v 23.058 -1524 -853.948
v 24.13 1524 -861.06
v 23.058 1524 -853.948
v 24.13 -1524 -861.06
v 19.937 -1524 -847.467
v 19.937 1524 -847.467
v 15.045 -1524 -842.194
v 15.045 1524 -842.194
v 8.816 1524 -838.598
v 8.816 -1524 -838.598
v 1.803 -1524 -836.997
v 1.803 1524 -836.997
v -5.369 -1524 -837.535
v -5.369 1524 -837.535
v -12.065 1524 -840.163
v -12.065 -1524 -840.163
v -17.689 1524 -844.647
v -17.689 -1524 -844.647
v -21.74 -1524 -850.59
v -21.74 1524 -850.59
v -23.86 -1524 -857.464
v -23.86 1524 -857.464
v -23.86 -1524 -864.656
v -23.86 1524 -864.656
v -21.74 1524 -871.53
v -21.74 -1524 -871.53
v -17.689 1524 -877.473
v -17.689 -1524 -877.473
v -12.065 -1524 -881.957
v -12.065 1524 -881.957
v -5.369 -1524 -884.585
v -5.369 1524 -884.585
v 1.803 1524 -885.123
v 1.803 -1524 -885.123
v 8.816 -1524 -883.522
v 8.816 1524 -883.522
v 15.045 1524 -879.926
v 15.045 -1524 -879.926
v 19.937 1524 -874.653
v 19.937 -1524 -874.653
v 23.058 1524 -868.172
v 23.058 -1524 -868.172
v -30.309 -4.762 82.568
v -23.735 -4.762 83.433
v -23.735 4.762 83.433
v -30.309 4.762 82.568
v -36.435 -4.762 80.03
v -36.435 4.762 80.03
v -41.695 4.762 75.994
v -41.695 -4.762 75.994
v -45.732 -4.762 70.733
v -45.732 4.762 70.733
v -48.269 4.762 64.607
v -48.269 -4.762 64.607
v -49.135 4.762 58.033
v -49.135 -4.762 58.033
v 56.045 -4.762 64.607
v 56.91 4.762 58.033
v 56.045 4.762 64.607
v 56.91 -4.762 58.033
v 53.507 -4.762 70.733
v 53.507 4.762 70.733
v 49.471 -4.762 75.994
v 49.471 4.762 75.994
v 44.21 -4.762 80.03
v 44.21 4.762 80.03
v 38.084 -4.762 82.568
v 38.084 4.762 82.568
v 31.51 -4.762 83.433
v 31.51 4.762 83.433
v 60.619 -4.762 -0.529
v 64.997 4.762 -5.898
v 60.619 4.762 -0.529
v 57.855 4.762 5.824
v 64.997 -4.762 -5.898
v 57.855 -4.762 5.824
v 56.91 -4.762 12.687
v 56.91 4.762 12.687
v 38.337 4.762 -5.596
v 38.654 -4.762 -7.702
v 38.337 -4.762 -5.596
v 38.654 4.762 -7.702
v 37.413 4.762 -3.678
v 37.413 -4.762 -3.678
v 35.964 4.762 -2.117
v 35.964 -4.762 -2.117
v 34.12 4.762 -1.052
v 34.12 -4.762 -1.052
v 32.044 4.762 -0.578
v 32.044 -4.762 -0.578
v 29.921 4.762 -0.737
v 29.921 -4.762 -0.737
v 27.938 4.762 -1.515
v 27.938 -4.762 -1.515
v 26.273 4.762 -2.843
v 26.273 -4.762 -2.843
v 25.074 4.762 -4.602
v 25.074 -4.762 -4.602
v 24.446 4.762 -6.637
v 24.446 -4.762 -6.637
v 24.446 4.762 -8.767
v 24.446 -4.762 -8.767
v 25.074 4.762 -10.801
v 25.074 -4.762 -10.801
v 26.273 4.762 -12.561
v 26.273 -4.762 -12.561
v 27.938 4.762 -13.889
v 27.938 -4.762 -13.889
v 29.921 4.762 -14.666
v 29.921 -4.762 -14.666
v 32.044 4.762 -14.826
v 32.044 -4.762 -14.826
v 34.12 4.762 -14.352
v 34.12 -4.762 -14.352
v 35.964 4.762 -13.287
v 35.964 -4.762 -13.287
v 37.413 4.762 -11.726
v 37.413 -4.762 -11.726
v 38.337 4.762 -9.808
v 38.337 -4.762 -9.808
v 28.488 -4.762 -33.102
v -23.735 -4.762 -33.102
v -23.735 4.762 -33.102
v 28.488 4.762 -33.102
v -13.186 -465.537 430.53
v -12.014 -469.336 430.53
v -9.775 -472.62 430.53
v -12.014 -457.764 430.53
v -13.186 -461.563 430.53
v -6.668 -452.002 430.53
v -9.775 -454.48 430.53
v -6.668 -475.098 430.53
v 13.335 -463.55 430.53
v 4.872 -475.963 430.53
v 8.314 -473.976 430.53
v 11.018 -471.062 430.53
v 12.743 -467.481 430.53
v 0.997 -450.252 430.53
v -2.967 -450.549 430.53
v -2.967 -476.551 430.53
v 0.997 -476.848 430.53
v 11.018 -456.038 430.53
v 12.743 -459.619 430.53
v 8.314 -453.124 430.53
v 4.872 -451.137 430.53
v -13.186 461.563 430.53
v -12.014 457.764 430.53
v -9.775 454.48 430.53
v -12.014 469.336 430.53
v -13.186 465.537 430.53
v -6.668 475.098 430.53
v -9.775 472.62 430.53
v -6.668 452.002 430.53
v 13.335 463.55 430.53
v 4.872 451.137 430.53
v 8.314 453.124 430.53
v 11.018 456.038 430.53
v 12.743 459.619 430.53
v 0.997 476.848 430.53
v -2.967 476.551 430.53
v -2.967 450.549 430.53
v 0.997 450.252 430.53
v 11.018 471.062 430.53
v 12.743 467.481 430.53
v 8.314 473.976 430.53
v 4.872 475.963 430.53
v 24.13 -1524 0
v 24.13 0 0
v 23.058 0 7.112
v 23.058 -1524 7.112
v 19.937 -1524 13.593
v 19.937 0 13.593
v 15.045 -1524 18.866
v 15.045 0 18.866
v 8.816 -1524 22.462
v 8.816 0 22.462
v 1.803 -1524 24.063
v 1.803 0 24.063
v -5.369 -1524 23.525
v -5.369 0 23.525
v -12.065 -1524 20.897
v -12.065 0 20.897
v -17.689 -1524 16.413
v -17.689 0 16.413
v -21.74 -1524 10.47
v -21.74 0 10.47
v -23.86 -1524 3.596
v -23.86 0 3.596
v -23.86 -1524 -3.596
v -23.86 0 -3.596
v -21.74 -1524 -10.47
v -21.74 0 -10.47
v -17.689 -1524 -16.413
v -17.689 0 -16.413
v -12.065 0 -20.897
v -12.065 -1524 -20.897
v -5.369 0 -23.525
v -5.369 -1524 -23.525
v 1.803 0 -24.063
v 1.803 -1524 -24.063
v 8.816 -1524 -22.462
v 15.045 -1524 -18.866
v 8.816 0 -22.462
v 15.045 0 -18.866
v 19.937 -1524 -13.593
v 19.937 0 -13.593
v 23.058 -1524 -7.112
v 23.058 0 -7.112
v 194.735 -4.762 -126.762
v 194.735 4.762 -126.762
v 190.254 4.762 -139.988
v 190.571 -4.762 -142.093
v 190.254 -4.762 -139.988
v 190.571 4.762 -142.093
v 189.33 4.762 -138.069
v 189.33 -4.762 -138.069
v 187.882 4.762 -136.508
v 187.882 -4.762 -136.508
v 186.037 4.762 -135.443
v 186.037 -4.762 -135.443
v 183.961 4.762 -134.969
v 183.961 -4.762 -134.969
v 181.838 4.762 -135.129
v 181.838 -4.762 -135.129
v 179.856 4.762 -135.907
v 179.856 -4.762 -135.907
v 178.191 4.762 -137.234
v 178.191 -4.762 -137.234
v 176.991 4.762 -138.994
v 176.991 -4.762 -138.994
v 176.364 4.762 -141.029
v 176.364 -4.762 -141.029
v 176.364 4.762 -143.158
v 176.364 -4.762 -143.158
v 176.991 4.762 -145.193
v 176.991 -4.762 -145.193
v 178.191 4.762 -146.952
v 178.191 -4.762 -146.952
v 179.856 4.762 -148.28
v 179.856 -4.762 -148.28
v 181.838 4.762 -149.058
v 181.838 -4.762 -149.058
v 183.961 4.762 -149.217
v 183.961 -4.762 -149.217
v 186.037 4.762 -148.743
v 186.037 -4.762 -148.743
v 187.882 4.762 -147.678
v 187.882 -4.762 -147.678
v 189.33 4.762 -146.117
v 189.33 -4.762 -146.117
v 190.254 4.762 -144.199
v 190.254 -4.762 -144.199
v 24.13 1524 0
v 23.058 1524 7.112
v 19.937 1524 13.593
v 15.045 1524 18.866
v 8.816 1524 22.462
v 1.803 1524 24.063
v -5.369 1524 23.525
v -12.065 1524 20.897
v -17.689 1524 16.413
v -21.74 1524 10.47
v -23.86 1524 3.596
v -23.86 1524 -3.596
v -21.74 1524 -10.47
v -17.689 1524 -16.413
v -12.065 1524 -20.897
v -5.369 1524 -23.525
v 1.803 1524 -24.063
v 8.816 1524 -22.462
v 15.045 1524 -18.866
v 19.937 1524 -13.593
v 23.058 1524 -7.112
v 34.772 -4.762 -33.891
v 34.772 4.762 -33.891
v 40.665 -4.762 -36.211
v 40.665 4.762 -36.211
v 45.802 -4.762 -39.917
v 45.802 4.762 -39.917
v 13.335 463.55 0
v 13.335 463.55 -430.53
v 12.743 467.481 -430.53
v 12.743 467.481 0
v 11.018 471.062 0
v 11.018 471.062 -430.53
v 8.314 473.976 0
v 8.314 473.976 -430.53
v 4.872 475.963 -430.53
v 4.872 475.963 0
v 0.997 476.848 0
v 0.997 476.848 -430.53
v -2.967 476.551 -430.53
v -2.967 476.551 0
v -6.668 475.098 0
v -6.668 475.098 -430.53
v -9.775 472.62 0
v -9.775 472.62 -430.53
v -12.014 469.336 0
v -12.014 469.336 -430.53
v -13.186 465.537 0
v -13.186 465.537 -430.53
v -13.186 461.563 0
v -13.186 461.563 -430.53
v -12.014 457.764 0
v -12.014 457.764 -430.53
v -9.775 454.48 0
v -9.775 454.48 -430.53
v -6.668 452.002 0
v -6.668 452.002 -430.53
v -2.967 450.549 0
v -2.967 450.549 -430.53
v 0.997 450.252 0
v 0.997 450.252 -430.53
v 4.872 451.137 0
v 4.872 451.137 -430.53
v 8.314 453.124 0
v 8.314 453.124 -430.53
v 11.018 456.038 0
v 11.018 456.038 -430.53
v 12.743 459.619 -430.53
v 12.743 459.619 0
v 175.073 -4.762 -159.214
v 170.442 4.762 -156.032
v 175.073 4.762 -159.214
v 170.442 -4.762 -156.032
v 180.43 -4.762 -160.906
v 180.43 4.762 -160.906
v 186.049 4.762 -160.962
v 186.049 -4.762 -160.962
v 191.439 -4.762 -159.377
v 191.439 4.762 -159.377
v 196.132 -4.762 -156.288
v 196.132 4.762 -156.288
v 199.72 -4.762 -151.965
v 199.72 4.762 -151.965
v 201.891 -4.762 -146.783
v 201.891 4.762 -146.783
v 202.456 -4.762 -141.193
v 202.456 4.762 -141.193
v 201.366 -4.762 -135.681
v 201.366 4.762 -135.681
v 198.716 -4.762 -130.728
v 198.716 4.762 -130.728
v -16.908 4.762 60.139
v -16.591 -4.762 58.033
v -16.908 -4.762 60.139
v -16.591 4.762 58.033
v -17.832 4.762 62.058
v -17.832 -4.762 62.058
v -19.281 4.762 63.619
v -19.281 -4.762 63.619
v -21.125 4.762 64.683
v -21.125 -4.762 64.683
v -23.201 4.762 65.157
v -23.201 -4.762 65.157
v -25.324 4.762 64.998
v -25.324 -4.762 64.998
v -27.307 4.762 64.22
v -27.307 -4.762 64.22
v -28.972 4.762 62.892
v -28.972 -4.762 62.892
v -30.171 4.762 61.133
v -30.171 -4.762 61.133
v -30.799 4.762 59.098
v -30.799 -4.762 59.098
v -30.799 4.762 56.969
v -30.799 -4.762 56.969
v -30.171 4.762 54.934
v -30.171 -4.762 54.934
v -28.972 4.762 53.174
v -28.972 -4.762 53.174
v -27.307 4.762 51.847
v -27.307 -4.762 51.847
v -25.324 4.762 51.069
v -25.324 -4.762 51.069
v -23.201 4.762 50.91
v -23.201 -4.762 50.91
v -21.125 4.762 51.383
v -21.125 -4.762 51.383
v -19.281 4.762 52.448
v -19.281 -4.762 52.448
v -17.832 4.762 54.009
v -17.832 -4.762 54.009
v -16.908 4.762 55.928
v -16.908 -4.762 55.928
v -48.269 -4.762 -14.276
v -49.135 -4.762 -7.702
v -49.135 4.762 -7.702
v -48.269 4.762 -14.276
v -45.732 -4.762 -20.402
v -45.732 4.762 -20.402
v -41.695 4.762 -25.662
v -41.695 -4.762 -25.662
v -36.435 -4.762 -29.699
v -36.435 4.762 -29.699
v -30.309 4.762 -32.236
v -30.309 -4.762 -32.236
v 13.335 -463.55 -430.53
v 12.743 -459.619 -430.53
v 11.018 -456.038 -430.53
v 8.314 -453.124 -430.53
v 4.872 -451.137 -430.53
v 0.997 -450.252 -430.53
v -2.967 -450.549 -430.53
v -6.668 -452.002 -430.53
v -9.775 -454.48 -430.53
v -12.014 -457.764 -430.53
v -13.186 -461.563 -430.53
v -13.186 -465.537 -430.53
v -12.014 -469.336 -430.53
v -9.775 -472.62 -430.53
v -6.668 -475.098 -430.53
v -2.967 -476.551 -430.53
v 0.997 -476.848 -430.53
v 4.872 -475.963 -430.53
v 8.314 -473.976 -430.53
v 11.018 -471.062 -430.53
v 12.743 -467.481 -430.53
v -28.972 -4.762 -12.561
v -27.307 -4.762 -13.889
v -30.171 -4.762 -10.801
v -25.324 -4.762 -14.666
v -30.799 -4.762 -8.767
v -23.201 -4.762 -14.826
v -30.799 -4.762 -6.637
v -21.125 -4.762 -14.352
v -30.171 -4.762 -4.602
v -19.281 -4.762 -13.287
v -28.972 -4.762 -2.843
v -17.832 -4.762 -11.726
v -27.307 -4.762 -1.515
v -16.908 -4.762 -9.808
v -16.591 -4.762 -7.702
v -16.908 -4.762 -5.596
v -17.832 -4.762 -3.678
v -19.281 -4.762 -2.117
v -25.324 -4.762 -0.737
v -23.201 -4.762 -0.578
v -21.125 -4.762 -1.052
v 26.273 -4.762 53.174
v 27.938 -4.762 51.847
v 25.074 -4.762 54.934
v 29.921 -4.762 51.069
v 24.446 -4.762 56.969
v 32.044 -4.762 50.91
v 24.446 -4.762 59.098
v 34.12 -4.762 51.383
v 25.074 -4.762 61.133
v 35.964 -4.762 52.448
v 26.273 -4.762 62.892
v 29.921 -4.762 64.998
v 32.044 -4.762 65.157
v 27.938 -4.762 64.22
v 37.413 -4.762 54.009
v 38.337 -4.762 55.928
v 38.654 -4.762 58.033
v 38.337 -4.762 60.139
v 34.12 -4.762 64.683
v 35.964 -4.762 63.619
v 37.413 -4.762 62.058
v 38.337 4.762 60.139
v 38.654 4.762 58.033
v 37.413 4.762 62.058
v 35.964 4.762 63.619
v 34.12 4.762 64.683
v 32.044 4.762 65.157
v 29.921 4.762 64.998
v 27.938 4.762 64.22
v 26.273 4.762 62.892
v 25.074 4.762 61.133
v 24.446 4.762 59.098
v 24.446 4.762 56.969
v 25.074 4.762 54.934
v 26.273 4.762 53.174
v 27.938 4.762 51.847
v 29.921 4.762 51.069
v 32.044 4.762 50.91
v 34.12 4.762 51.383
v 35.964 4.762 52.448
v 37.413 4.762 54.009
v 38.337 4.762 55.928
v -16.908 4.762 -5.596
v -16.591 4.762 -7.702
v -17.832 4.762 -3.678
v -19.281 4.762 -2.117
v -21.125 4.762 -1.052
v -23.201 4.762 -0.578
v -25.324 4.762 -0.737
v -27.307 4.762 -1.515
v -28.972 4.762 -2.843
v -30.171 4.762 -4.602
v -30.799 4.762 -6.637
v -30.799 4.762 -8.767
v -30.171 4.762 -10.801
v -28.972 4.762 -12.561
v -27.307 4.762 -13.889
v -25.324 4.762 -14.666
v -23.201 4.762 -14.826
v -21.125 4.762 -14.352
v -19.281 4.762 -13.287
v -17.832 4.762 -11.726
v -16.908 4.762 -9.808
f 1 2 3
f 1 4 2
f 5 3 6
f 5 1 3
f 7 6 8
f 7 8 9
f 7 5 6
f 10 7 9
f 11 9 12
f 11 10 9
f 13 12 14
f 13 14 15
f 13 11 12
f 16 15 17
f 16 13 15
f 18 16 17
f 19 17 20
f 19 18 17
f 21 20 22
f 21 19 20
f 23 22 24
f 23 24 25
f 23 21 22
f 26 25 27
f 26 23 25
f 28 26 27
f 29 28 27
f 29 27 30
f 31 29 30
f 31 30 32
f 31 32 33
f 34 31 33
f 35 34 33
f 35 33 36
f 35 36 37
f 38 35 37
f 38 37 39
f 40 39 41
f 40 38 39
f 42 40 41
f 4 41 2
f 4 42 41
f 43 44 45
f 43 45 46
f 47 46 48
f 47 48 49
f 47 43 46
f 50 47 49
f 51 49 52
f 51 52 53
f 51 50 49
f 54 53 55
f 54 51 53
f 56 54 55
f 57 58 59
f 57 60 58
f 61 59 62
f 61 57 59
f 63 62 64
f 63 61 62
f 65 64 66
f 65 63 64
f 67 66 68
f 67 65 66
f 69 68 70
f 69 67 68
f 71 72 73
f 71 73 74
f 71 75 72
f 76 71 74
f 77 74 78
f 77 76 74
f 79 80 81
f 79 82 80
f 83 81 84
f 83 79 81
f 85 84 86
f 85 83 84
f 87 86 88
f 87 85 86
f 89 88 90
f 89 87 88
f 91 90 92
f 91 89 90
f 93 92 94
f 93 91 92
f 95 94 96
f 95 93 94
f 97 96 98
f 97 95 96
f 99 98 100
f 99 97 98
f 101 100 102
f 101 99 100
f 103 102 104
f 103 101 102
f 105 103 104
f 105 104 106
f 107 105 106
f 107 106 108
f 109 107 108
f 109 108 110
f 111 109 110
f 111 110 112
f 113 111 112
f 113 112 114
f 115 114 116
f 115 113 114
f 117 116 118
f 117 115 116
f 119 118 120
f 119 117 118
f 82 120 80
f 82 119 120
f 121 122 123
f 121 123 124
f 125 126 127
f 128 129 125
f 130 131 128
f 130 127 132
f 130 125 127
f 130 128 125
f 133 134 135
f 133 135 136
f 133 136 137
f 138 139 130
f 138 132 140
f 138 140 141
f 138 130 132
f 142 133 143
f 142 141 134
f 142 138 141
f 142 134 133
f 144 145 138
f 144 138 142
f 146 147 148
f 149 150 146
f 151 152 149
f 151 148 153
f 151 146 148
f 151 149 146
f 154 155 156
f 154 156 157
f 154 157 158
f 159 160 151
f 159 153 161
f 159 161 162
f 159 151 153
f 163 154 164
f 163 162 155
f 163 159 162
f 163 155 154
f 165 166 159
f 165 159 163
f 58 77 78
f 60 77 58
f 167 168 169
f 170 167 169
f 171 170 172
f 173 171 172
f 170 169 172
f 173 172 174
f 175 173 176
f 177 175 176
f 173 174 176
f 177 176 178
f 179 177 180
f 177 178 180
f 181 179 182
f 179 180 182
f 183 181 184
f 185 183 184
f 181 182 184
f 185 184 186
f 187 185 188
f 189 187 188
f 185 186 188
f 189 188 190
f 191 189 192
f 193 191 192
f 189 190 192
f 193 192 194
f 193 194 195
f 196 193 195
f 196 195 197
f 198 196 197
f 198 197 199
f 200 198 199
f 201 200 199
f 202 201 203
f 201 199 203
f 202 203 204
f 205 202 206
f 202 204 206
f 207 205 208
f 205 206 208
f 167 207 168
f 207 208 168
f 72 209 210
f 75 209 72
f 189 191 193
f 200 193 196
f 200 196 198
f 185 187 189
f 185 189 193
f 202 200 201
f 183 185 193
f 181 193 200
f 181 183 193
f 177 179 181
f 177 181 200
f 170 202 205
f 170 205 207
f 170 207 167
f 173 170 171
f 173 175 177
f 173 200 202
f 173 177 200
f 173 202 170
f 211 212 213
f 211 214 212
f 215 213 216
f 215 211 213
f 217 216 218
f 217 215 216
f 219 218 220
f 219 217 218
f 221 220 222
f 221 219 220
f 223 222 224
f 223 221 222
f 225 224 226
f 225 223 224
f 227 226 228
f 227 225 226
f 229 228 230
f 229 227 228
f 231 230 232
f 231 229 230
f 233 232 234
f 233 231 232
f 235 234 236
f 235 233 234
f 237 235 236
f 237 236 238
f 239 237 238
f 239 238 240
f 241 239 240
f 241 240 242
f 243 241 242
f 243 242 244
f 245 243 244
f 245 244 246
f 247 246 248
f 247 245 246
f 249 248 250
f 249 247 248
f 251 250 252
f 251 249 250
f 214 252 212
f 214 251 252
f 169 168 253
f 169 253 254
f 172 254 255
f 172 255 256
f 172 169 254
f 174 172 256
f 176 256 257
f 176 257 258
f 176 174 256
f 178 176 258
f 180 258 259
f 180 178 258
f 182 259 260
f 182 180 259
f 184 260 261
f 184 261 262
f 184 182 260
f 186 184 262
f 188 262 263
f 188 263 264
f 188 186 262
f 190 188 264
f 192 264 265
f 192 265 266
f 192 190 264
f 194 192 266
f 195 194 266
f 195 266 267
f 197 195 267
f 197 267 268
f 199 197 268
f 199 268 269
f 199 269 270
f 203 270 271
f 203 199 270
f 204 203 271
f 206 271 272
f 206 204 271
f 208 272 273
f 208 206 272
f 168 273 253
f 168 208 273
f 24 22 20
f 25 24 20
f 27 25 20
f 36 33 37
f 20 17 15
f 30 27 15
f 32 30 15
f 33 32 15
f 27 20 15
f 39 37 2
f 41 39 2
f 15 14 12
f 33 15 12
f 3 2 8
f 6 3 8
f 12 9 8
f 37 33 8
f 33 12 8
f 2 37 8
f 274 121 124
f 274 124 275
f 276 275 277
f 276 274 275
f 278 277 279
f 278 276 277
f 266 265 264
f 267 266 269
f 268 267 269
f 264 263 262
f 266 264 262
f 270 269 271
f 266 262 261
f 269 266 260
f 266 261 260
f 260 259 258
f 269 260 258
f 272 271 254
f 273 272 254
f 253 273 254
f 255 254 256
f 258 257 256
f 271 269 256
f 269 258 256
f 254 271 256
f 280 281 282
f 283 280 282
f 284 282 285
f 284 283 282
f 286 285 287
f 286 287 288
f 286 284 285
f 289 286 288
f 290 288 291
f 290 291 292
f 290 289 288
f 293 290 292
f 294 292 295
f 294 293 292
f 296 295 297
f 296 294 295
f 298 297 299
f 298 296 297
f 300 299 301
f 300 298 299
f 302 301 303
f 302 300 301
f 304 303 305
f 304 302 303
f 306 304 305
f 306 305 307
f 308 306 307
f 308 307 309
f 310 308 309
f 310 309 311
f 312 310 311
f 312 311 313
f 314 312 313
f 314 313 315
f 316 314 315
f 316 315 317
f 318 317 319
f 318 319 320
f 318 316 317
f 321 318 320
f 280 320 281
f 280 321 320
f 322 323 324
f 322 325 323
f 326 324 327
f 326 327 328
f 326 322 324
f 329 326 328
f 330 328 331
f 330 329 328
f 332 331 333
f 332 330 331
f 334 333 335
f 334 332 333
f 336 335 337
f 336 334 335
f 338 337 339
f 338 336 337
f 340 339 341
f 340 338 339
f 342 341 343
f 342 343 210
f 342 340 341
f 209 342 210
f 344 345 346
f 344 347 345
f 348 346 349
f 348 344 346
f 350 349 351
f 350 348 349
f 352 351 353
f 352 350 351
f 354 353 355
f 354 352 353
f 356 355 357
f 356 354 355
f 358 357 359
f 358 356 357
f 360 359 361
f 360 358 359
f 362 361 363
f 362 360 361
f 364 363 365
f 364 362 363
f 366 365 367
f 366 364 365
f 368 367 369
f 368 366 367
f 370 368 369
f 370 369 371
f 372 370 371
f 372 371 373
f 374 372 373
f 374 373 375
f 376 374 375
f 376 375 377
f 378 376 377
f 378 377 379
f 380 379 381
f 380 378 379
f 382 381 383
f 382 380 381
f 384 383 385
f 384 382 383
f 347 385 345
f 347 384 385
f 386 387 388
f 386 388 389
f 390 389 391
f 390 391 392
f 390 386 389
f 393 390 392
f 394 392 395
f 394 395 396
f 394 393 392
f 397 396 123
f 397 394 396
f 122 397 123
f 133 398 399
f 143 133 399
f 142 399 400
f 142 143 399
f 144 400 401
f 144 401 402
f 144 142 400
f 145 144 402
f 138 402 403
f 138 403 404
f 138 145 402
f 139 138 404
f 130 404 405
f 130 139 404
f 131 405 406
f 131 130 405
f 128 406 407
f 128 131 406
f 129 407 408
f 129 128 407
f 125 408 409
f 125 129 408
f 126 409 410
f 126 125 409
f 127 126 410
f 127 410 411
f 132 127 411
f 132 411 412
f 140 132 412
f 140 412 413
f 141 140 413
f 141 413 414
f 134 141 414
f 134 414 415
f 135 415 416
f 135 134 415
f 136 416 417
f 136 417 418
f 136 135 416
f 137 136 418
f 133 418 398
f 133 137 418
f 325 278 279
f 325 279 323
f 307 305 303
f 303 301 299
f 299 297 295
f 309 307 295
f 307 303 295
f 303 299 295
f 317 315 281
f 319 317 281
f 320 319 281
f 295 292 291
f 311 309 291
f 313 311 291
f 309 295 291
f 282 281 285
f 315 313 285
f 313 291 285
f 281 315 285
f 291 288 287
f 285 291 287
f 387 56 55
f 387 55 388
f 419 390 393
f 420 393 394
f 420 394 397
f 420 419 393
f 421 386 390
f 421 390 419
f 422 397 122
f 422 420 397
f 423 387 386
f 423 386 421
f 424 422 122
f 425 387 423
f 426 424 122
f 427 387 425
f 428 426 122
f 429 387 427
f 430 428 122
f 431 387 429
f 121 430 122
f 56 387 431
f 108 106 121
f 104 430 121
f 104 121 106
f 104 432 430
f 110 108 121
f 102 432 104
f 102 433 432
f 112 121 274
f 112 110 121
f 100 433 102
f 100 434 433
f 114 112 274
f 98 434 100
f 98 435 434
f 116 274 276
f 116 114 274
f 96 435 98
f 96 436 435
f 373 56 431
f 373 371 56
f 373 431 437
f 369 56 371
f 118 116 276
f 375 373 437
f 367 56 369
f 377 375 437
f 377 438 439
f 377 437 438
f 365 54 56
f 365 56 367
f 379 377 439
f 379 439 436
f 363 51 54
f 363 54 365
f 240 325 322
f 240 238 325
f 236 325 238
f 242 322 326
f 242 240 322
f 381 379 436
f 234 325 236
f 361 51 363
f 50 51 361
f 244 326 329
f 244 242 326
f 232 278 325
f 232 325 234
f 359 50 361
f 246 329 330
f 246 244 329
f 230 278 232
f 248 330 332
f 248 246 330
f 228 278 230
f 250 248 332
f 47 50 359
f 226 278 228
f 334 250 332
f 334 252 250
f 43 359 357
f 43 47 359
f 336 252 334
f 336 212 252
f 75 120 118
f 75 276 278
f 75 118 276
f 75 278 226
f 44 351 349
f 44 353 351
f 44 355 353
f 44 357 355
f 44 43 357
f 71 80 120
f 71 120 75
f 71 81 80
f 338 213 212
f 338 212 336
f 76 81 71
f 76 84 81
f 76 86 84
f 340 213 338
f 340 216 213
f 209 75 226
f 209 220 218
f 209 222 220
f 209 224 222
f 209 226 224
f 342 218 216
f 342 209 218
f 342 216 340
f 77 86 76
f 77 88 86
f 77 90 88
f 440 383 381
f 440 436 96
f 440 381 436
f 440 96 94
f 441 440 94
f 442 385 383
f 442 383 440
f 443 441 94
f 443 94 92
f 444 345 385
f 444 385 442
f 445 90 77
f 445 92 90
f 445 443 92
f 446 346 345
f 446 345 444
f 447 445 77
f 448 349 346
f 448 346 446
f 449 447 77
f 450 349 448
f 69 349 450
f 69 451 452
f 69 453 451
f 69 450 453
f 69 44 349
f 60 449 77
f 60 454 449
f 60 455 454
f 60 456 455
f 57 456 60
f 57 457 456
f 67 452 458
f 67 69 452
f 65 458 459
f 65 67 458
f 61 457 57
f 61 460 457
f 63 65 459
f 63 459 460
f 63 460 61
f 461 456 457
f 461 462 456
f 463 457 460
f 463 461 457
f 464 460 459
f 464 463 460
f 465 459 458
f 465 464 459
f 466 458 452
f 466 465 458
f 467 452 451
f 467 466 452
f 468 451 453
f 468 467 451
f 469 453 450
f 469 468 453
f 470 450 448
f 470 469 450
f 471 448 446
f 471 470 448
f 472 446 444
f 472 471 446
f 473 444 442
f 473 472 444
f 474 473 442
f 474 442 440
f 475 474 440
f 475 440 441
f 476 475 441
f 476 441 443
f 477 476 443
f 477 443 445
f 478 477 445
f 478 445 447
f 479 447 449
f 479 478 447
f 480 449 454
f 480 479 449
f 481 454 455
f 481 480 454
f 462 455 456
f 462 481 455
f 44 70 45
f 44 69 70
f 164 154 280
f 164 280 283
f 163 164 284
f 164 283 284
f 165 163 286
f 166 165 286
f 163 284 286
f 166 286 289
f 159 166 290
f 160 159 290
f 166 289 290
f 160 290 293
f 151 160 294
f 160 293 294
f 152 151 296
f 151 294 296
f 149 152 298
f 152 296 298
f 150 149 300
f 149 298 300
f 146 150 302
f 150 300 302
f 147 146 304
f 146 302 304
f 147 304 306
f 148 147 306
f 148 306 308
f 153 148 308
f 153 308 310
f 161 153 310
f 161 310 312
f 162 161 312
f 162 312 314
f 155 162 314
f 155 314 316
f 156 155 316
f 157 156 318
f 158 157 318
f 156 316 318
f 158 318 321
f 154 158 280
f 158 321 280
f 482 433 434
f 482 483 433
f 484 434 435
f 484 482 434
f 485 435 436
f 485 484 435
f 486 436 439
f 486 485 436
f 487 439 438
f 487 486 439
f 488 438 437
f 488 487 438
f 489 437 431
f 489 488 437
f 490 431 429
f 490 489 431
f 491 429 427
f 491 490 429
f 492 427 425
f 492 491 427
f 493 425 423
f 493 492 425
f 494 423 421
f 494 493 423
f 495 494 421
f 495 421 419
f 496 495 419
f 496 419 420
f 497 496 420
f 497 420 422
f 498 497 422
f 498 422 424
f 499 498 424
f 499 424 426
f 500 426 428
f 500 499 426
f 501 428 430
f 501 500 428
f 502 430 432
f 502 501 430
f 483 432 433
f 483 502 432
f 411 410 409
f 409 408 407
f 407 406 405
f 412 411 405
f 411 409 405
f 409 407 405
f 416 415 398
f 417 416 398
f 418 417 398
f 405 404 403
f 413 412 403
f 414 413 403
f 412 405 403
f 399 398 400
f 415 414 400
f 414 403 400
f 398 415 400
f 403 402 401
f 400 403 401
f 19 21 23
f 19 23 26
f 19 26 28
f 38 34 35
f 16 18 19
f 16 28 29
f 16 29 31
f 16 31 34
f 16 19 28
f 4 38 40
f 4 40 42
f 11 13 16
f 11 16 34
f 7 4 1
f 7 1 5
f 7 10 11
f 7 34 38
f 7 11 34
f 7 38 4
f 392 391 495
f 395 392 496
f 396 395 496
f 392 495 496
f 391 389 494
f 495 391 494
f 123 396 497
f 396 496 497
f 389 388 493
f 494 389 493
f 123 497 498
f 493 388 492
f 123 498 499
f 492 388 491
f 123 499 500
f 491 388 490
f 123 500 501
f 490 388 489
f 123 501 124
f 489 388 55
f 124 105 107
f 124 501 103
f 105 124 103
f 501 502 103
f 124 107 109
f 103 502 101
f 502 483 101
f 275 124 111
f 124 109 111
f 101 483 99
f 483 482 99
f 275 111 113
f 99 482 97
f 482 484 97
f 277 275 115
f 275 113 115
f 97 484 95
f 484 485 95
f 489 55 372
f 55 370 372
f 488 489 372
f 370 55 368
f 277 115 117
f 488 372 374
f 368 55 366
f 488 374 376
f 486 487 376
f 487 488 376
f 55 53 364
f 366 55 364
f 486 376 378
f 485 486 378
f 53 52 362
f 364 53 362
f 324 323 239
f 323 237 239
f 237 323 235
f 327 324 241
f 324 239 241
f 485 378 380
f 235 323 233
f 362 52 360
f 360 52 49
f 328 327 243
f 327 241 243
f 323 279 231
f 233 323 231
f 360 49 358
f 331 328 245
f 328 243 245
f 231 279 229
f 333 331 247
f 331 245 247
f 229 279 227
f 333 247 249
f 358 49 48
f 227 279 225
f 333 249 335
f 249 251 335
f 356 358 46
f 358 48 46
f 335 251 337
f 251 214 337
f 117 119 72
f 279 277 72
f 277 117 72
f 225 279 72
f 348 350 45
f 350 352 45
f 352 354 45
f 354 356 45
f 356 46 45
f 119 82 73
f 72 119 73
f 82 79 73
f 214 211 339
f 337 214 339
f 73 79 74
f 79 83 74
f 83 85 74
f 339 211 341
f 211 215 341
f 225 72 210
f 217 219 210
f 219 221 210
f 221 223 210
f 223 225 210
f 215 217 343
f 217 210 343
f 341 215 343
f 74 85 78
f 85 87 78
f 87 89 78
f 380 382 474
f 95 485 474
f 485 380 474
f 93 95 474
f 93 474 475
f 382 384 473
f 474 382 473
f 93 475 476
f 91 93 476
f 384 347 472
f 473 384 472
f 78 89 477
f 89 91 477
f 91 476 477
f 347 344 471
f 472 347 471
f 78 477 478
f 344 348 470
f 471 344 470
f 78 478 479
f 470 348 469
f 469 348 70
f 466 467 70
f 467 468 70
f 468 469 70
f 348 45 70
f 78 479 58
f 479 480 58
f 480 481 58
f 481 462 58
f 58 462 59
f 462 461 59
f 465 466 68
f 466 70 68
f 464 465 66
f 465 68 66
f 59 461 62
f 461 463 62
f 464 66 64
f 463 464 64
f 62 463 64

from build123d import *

# Parameters (mm, degrees)
F0_R     = 7.14375
F1_DEPTH = 4.7625
F2_R     = 24.13
F3_DEPTH = 1524
F4_R     = 13.335
F5_DEPTH = 430.53


with BuildPart() as f1:
    # F0 (on Front) → F1 (new body, symmetric)
    with BuildSketch(Plane.XZ):
        with BuildLine():
            Line((31.510166, 83.433357), (-23.734834, 83.433357))
            ThreePointArc((-23.734834, 83.433357), (-41.695346, 75.993869), (-49.134834, 58.033357))
            Line((-49.134834, 58.033357), (-49.134834, -7.701843))
            ThreePointArc((-49.134834, -7.701843), (-41.695346, -25.662355), (-23.734834, -33.101843))
            Line((-23.734834, -33.101843), (28.488076, -33.101843))
            ThreePointArc((28.488076, -33.101843), (37.791407, -34.866953), (45.801715, -39.91696))
            Line((45.801715, -39.91696), (170.442337, -156.031906))
            ThreePointArc((170.442337, -156.031906), (198.086385, -154.259654), (194.735293, -126.7623))
            Line((194.735293, -126.7623), (64.996527, -5.897934))
            ThreePointArc((64.996527, -5.897934), (59.019327, 2.553008), (56.910166, 12.68695))
            Line((56.910166, 12.68695), (56.910166, 58.033357))
            ThreePointArc((56.910166, 58.033357), (49.470679, 75.993869), (31.510166, 83.433357))
        make_face()
        with Locations((183.427566, -142.093243)):
            Circle(F0_R, mode=Mode.SUBTRACT)
        with Locations((-23.734834, -7.701843)):
            Circle(F0_R, mode=Mode.SUBTRACT)
        with Locations((31.510166, -7.701843)):
            Circle(F0_R, mode=Mode.SUBTRACT)
        with Locations((-23.734834, 58.033357)):
            Circle(F0_R, mode=Mode.SUBTRACT)
        with Locations((31.510166, 58.033357)):
            Circle(F0_R, mode=Mode.SUBTRACT)
    extrude(amount=F1_DEPTH, both=True)


with BuildPart() as f3:
    # F2 (on Front) → F3 (new body, symmetric)
    with BuildSketch(Plane.XZ):
        Circle(F2_R)
        with Locations((0, -861.06)):
            Circle(F2_R)
    extrude(amount=F3_DEPTH, both=True)


with BuildPart() as f5:
    # F4 (on Top) → F5 (new body, symmetric)
    with BuildSketch(Plane.XY):
        with Locations((0, 463.55)):
            Circle(F4_R)
        with Locations((0, -463.55)):
            Circle(F4_R)
    extrude(amount=F5_DEPTH, both=True)


solid = Compound([f1.part, f3.part, f5.part])
